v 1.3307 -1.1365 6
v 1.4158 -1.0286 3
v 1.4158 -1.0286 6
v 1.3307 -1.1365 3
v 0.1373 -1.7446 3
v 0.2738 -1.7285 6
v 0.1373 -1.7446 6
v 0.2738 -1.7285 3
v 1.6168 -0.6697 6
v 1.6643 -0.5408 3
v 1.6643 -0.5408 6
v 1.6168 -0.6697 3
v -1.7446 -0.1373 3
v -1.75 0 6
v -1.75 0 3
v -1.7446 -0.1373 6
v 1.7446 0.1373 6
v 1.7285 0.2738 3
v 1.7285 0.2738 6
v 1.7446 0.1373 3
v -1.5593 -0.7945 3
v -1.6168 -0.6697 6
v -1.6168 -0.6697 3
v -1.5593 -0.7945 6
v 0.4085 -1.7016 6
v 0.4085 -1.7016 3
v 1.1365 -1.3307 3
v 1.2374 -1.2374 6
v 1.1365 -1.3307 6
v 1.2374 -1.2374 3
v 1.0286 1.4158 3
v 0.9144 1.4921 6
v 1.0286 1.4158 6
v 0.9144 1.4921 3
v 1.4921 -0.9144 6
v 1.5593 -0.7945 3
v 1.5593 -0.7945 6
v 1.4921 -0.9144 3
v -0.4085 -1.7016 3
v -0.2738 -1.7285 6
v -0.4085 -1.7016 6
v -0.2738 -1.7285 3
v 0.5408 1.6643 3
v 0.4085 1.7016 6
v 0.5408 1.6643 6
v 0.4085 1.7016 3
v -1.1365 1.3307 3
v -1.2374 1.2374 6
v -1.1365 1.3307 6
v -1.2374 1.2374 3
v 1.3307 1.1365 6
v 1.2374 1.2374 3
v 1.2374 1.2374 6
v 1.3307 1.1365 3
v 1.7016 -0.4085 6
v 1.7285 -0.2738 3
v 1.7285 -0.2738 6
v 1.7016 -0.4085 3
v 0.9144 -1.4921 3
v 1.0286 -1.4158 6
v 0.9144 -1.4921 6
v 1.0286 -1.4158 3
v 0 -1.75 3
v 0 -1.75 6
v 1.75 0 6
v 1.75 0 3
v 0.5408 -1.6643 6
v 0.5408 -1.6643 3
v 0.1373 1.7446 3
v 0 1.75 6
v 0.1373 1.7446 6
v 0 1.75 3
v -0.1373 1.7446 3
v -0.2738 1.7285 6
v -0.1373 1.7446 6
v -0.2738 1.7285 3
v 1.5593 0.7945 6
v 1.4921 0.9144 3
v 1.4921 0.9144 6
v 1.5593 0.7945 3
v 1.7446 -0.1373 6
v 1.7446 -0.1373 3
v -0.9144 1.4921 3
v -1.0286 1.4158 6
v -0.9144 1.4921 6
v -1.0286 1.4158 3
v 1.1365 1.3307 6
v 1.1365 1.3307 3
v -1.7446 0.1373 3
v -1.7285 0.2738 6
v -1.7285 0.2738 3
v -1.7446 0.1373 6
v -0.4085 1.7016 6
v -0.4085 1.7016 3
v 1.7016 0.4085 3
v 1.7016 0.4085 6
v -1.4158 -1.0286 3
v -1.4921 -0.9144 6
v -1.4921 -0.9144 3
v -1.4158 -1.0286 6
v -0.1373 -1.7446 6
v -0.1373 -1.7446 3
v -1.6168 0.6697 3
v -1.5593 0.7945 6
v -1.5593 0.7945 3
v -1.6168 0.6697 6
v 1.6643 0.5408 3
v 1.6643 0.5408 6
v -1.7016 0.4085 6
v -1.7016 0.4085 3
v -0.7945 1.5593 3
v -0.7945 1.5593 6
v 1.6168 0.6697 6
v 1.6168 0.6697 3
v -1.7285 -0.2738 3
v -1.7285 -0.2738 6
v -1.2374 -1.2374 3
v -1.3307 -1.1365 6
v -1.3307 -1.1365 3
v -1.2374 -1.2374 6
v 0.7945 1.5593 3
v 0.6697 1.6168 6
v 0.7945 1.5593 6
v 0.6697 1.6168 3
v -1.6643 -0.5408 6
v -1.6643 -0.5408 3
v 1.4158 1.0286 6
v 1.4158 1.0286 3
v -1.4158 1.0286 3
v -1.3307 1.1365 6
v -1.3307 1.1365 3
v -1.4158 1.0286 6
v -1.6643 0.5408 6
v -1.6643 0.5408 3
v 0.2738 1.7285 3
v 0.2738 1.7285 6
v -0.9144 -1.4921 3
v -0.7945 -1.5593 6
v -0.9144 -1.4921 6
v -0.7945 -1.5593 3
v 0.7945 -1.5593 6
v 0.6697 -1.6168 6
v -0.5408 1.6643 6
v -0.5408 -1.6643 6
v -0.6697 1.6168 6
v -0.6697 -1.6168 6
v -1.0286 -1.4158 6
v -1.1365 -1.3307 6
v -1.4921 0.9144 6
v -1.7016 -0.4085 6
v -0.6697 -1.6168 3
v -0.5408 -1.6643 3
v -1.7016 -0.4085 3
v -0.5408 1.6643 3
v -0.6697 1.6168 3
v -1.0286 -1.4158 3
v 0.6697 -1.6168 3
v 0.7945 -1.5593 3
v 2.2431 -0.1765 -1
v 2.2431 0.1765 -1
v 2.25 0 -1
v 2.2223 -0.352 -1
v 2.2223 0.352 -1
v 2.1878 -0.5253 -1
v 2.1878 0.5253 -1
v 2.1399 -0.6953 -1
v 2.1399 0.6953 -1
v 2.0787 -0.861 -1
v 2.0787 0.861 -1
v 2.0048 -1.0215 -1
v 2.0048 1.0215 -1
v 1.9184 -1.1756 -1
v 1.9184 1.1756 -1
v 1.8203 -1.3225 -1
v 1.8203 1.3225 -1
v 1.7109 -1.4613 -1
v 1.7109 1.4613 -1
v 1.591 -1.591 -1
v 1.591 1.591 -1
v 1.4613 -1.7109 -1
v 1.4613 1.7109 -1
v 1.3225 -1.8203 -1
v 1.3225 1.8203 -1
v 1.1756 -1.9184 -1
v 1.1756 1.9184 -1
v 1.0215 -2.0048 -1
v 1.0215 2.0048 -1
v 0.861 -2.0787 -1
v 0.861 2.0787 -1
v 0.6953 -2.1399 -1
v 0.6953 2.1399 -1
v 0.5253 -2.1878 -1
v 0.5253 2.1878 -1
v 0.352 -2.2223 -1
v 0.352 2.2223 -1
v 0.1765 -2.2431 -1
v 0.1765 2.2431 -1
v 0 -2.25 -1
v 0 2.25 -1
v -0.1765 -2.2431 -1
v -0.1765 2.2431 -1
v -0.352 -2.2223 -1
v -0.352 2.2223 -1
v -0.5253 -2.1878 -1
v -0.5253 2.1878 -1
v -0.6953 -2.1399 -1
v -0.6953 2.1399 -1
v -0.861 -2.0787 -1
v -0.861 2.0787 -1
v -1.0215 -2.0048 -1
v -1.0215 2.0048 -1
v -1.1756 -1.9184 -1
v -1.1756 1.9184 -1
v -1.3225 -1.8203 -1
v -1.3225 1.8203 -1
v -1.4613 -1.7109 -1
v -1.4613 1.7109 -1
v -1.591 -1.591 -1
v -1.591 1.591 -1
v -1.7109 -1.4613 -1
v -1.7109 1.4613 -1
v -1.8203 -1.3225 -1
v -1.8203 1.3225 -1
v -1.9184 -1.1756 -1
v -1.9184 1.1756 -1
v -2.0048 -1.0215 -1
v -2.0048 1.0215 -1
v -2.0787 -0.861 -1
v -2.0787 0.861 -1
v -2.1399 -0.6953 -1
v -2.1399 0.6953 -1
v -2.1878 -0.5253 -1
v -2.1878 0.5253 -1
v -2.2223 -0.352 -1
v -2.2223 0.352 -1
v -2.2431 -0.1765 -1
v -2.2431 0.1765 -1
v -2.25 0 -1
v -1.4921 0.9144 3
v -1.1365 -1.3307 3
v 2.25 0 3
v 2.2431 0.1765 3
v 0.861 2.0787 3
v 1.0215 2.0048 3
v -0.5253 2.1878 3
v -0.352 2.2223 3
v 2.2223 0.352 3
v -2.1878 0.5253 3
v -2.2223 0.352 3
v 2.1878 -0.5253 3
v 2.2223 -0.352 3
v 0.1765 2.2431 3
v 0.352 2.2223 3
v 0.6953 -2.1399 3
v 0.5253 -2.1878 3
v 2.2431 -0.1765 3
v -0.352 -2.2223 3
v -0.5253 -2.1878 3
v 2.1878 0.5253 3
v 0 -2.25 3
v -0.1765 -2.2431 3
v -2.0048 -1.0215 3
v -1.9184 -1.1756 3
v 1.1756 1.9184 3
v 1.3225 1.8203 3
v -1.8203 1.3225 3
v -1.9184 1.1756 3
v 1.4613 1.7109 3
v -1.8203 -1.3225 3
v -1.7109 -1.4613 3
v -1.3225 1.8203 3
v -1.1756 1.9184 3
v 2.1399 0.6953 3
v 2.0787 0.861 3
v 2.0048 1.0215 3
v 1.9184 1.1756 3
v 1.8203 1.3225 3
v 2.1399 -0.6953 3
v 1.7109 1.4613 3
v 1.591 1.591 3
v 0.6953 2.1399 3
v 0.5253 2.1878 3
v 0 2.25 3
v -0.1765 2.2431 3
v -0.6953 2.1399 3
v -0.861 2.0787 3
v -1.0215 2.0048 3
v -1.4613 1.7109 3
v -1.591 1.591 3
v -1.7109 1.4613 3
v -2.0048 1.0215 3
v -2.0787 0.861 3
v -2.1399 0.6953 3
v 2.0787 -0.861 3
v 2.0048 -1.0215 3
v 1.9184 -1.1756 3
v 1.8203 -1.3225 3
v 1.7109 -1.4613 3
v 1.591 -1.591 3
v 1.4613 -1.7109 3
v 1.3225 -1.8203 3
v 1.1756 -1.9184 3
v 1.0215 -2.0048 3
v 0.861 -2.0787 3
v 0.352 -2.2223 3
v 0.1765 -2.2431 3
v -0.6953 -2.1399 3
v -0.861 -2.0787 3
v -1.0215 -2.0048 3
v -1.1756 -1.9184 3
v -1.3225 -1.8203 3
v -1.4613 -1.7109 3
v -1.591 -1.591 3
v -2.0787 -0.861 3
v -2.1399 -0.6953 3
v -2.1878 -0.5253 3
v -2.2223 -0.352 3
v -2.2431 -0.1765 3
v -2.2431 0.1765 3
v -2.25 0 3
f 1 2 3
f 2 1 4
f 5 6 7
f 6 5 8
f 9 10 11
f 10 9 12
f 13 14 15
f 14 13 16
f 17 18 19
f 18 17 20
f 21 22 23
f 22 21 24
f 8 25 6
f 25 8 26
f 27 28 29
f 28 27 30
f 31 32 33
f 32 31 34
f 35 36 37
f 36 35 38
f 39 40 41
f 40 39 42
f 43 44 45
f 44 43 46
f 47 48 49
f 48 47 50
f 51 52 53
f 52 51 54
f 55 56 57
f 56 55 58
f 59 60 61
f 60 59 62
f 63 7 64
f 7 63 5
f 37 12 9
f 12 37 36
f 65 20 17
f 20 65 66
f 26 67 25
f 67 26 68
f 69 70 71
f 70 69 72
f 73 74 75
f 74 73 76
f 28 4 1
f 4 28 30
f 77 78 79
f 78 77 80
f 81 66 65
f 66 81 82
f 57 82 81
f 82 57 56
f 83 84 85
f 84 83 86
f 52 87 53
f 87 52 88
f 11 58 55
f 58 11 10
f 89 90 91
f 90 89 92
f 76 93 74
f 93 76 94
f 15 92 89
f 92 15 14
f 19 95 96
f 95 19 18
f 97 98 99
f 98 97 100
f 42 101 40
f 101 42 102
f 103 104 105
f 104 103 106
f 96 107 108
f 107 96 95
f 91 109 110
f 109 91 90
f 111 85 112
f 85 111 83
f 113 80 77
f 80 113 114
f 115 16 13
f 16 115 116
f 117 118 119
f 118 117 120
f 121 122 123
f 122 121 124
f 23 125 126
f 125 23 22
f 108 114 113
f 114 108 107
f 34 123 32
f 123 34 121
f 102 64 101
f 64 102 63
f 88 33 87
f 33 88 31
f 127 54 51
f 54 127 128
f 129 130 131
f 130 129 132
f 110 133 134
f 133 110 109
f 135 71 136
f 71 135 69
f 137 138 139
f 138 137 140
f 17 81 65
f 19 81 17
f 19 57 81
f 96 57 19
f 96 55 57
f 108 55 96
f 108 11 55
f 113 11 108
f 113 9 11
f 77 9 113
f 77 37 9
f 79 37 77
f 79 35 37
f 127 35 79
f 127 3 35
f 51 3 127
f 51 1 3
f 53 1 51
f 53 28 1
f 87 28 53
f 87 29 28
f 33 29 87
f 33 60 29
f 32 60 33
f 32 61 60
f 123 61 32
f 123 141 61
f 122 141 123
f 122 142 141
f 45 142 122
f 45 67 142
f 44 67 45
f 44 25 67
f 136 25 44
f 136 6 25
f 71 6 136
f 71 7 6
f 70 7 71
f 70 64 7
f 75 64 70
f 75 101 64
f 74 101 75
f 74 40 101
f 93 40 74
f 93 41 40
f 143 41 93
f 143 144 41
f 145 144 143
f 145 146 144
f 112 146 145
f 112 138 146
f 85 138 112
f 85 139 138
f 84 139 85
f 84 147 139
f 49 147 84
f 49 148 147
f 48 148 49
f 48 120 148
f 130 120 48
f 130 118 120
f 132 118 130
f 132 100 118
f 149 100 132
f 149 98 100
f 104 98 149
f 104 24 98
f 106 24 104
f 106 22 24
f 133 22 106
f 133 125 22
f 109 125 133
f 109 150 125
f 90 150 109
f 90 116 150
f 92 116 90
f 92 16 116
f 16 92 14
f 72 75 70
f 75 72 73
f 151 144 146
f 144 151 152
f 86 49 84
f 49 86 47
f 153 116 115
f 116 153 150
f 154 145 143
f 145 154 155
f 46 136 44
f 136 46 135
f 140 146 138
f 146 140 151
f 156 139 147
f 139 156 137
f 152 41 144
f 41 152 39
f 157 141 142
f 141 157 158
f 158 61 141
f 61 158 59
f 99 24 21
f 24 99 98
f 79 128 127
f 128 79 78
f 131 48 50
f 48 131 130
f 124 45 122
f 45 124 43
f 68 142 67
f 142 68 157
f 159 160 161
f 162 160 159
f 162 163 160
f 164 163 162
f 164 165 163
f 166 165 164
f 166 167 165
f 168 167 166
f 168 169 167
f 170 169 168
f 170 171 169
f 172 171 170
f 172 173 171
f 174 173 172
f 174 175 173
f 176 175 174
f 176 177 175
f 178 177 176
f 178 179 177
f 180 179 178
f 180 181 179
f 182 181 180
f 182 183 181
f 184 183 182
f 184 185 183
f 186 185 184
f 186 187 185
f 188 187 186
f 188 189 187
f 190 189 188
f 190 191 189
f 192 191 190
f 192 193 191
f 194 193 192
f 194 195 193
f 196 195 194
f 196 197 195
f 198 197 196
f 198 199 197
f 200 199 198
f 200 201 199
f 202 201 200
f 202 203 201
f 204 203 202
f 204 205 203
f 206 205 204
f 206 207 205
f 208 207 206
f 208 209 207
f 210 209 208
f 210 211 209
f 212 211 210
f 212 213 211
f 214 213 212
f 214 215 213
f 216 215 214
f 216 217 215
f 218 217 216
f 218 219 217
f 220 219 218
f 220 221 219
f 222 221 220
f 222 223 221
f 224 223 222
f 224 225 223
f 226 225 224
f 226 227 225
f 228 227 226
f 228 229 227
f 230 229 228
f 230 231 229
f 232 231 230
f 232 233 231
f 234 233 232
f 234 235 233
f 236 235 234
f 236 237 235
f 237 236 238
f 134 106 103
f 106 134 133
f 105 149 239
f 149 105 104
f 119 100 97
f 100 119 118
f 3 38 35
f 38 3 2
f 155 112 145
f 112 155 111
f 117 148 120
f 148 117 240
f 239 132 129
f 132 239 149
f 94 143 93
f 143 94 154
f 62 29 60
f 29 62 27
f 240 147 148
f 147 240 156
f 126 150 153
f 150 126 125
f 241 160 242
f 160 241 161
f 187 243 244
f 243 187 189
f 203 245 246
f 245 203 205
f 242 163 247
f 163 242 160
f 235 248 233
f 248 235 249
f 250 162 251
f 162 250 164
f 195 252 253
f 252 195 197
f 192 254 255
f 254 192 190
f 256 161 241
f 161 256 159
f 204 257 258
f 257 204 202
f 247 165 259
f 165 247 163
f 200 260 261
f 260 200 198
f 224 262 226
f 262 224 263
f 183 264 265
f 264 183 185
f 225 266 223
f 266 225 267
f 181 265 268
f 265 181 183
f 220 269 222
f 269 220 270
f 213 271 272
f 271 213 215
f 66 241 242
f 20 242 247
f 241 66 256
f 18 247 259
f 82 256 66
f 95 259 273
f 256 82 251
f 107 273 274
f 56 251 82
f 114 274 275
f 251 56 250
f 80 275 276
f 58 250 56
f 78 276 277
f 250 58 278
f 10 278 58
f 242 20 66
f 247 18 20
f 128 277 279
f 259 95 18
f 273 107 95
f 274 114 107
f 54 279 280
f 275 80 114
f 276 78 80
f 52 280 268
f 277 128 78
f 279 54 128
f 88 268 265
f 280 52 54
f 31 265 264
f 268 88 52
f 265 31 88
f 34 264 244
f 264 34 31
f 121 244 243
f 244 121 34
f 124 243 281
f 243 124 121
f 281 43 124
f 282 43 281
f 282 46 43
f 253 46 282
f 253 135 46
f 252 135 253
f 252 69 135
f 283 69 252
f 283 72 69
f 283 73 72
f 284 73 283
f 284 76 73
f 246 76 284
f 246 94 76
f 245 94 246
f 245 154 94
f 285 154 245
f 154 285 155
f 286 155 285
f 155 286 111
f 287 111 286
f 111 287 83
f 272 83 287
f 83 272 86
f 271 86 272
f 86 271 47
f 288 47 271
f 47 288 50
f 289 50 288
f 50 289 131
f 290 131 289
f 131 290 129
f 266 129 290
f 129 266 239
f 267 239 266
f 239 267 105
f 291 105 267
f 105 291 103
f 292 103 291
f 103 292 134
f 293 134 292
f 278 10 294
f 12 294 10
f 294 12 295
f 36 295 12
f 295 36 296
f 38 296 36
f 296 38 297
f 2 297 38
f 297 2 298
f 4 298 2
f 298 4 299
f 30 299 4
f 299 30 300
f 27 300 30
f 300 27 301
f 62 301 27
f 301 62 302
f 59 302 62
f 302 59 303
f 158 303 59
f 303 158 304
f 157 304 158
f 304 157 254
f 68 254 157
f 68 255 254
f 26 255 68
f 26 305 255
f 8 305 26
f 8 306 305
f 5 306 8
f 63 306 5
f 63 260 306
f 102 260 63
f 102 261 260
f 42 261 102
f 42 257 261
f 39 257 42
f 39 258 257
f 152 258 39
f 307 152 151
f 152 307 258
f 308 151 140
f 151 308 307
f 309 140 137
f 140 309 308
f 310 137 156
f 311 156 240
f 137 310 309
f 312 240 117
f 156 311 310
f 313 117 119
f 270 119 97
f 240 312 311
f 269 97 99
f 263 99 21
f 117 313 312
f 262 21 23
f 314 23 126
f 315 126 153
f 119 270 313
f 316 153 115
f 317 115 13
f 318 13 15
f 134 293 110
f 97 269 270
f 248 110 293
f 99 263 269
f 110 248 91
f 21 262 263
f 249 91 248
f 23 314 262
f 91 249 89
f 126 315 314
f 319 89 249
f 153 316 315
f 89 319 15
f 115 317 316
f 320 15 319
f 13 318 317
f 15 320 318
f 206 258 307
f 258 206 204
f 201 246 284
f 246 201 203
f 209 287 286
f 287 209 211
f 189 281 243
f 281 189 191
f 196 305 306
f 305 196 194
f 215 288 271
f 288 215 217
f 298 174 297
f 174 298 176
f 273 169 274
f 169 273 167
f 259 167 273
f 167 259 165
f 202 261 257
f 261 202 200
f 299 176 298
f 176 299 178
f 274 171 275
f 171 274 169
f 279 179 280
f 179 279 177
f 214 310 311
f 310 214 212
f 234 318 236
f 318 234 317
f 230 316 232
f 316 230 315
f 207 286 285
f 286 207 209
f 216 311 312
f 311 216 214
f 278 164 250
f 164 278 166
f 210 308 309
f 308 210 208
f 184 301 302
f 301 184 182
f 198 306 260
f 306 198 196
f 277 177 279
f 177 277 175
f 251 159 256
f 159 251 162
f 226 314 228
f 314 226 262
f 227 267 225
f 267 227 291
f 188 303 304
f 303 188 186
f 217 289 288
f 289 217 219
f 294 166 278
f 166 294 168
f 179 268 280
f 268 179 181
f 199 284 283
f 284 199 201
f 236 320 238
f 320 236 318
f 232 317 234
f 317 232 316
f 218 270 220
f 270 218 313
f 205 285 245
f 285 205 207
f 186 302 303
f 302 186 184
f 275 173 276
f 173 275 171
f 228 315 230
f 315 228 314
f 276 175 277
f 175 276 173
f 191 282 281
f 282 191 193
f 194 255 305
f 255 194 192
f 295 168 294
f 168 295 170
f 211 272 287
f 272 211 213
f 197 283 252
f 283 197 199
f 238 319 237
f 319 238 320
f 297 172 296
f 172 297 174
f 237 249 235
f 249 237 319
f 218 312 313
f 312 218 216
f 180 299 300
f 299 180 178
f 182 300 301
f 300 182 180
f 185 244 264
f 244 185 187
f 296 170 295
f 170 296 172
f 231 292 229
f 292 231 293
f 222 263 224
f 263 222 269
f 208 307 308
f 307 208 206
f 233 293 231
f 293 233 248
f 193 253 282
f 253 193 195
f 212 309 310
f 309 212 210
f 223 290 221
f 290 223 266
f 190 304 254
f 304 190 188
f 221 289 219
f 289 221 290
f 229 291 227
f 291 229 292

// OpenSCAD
/*
 * This code is licensed under the CC BY-NC-SA 4.0 (Attribution-NonCommercial-ShareAlike).
 * Please read LICENCE.md for full details.
 *
 * Various modules for LED mounts
 */

module Led(d,t) {
    translate([0,0,-1])
        cylinder(r=(d/2)+.25, h=t+2, $fn=80);
    // Show cutout for walls too thick for a 3mm LED
    if( t > 3 ) {
        //translate([0,0,3])
        Led(4,t-3);
    }
}

module Led3(t) {
    Led(3,t);
}

module Led5(t) {
    Led(5,t);
}

Led3(5);
